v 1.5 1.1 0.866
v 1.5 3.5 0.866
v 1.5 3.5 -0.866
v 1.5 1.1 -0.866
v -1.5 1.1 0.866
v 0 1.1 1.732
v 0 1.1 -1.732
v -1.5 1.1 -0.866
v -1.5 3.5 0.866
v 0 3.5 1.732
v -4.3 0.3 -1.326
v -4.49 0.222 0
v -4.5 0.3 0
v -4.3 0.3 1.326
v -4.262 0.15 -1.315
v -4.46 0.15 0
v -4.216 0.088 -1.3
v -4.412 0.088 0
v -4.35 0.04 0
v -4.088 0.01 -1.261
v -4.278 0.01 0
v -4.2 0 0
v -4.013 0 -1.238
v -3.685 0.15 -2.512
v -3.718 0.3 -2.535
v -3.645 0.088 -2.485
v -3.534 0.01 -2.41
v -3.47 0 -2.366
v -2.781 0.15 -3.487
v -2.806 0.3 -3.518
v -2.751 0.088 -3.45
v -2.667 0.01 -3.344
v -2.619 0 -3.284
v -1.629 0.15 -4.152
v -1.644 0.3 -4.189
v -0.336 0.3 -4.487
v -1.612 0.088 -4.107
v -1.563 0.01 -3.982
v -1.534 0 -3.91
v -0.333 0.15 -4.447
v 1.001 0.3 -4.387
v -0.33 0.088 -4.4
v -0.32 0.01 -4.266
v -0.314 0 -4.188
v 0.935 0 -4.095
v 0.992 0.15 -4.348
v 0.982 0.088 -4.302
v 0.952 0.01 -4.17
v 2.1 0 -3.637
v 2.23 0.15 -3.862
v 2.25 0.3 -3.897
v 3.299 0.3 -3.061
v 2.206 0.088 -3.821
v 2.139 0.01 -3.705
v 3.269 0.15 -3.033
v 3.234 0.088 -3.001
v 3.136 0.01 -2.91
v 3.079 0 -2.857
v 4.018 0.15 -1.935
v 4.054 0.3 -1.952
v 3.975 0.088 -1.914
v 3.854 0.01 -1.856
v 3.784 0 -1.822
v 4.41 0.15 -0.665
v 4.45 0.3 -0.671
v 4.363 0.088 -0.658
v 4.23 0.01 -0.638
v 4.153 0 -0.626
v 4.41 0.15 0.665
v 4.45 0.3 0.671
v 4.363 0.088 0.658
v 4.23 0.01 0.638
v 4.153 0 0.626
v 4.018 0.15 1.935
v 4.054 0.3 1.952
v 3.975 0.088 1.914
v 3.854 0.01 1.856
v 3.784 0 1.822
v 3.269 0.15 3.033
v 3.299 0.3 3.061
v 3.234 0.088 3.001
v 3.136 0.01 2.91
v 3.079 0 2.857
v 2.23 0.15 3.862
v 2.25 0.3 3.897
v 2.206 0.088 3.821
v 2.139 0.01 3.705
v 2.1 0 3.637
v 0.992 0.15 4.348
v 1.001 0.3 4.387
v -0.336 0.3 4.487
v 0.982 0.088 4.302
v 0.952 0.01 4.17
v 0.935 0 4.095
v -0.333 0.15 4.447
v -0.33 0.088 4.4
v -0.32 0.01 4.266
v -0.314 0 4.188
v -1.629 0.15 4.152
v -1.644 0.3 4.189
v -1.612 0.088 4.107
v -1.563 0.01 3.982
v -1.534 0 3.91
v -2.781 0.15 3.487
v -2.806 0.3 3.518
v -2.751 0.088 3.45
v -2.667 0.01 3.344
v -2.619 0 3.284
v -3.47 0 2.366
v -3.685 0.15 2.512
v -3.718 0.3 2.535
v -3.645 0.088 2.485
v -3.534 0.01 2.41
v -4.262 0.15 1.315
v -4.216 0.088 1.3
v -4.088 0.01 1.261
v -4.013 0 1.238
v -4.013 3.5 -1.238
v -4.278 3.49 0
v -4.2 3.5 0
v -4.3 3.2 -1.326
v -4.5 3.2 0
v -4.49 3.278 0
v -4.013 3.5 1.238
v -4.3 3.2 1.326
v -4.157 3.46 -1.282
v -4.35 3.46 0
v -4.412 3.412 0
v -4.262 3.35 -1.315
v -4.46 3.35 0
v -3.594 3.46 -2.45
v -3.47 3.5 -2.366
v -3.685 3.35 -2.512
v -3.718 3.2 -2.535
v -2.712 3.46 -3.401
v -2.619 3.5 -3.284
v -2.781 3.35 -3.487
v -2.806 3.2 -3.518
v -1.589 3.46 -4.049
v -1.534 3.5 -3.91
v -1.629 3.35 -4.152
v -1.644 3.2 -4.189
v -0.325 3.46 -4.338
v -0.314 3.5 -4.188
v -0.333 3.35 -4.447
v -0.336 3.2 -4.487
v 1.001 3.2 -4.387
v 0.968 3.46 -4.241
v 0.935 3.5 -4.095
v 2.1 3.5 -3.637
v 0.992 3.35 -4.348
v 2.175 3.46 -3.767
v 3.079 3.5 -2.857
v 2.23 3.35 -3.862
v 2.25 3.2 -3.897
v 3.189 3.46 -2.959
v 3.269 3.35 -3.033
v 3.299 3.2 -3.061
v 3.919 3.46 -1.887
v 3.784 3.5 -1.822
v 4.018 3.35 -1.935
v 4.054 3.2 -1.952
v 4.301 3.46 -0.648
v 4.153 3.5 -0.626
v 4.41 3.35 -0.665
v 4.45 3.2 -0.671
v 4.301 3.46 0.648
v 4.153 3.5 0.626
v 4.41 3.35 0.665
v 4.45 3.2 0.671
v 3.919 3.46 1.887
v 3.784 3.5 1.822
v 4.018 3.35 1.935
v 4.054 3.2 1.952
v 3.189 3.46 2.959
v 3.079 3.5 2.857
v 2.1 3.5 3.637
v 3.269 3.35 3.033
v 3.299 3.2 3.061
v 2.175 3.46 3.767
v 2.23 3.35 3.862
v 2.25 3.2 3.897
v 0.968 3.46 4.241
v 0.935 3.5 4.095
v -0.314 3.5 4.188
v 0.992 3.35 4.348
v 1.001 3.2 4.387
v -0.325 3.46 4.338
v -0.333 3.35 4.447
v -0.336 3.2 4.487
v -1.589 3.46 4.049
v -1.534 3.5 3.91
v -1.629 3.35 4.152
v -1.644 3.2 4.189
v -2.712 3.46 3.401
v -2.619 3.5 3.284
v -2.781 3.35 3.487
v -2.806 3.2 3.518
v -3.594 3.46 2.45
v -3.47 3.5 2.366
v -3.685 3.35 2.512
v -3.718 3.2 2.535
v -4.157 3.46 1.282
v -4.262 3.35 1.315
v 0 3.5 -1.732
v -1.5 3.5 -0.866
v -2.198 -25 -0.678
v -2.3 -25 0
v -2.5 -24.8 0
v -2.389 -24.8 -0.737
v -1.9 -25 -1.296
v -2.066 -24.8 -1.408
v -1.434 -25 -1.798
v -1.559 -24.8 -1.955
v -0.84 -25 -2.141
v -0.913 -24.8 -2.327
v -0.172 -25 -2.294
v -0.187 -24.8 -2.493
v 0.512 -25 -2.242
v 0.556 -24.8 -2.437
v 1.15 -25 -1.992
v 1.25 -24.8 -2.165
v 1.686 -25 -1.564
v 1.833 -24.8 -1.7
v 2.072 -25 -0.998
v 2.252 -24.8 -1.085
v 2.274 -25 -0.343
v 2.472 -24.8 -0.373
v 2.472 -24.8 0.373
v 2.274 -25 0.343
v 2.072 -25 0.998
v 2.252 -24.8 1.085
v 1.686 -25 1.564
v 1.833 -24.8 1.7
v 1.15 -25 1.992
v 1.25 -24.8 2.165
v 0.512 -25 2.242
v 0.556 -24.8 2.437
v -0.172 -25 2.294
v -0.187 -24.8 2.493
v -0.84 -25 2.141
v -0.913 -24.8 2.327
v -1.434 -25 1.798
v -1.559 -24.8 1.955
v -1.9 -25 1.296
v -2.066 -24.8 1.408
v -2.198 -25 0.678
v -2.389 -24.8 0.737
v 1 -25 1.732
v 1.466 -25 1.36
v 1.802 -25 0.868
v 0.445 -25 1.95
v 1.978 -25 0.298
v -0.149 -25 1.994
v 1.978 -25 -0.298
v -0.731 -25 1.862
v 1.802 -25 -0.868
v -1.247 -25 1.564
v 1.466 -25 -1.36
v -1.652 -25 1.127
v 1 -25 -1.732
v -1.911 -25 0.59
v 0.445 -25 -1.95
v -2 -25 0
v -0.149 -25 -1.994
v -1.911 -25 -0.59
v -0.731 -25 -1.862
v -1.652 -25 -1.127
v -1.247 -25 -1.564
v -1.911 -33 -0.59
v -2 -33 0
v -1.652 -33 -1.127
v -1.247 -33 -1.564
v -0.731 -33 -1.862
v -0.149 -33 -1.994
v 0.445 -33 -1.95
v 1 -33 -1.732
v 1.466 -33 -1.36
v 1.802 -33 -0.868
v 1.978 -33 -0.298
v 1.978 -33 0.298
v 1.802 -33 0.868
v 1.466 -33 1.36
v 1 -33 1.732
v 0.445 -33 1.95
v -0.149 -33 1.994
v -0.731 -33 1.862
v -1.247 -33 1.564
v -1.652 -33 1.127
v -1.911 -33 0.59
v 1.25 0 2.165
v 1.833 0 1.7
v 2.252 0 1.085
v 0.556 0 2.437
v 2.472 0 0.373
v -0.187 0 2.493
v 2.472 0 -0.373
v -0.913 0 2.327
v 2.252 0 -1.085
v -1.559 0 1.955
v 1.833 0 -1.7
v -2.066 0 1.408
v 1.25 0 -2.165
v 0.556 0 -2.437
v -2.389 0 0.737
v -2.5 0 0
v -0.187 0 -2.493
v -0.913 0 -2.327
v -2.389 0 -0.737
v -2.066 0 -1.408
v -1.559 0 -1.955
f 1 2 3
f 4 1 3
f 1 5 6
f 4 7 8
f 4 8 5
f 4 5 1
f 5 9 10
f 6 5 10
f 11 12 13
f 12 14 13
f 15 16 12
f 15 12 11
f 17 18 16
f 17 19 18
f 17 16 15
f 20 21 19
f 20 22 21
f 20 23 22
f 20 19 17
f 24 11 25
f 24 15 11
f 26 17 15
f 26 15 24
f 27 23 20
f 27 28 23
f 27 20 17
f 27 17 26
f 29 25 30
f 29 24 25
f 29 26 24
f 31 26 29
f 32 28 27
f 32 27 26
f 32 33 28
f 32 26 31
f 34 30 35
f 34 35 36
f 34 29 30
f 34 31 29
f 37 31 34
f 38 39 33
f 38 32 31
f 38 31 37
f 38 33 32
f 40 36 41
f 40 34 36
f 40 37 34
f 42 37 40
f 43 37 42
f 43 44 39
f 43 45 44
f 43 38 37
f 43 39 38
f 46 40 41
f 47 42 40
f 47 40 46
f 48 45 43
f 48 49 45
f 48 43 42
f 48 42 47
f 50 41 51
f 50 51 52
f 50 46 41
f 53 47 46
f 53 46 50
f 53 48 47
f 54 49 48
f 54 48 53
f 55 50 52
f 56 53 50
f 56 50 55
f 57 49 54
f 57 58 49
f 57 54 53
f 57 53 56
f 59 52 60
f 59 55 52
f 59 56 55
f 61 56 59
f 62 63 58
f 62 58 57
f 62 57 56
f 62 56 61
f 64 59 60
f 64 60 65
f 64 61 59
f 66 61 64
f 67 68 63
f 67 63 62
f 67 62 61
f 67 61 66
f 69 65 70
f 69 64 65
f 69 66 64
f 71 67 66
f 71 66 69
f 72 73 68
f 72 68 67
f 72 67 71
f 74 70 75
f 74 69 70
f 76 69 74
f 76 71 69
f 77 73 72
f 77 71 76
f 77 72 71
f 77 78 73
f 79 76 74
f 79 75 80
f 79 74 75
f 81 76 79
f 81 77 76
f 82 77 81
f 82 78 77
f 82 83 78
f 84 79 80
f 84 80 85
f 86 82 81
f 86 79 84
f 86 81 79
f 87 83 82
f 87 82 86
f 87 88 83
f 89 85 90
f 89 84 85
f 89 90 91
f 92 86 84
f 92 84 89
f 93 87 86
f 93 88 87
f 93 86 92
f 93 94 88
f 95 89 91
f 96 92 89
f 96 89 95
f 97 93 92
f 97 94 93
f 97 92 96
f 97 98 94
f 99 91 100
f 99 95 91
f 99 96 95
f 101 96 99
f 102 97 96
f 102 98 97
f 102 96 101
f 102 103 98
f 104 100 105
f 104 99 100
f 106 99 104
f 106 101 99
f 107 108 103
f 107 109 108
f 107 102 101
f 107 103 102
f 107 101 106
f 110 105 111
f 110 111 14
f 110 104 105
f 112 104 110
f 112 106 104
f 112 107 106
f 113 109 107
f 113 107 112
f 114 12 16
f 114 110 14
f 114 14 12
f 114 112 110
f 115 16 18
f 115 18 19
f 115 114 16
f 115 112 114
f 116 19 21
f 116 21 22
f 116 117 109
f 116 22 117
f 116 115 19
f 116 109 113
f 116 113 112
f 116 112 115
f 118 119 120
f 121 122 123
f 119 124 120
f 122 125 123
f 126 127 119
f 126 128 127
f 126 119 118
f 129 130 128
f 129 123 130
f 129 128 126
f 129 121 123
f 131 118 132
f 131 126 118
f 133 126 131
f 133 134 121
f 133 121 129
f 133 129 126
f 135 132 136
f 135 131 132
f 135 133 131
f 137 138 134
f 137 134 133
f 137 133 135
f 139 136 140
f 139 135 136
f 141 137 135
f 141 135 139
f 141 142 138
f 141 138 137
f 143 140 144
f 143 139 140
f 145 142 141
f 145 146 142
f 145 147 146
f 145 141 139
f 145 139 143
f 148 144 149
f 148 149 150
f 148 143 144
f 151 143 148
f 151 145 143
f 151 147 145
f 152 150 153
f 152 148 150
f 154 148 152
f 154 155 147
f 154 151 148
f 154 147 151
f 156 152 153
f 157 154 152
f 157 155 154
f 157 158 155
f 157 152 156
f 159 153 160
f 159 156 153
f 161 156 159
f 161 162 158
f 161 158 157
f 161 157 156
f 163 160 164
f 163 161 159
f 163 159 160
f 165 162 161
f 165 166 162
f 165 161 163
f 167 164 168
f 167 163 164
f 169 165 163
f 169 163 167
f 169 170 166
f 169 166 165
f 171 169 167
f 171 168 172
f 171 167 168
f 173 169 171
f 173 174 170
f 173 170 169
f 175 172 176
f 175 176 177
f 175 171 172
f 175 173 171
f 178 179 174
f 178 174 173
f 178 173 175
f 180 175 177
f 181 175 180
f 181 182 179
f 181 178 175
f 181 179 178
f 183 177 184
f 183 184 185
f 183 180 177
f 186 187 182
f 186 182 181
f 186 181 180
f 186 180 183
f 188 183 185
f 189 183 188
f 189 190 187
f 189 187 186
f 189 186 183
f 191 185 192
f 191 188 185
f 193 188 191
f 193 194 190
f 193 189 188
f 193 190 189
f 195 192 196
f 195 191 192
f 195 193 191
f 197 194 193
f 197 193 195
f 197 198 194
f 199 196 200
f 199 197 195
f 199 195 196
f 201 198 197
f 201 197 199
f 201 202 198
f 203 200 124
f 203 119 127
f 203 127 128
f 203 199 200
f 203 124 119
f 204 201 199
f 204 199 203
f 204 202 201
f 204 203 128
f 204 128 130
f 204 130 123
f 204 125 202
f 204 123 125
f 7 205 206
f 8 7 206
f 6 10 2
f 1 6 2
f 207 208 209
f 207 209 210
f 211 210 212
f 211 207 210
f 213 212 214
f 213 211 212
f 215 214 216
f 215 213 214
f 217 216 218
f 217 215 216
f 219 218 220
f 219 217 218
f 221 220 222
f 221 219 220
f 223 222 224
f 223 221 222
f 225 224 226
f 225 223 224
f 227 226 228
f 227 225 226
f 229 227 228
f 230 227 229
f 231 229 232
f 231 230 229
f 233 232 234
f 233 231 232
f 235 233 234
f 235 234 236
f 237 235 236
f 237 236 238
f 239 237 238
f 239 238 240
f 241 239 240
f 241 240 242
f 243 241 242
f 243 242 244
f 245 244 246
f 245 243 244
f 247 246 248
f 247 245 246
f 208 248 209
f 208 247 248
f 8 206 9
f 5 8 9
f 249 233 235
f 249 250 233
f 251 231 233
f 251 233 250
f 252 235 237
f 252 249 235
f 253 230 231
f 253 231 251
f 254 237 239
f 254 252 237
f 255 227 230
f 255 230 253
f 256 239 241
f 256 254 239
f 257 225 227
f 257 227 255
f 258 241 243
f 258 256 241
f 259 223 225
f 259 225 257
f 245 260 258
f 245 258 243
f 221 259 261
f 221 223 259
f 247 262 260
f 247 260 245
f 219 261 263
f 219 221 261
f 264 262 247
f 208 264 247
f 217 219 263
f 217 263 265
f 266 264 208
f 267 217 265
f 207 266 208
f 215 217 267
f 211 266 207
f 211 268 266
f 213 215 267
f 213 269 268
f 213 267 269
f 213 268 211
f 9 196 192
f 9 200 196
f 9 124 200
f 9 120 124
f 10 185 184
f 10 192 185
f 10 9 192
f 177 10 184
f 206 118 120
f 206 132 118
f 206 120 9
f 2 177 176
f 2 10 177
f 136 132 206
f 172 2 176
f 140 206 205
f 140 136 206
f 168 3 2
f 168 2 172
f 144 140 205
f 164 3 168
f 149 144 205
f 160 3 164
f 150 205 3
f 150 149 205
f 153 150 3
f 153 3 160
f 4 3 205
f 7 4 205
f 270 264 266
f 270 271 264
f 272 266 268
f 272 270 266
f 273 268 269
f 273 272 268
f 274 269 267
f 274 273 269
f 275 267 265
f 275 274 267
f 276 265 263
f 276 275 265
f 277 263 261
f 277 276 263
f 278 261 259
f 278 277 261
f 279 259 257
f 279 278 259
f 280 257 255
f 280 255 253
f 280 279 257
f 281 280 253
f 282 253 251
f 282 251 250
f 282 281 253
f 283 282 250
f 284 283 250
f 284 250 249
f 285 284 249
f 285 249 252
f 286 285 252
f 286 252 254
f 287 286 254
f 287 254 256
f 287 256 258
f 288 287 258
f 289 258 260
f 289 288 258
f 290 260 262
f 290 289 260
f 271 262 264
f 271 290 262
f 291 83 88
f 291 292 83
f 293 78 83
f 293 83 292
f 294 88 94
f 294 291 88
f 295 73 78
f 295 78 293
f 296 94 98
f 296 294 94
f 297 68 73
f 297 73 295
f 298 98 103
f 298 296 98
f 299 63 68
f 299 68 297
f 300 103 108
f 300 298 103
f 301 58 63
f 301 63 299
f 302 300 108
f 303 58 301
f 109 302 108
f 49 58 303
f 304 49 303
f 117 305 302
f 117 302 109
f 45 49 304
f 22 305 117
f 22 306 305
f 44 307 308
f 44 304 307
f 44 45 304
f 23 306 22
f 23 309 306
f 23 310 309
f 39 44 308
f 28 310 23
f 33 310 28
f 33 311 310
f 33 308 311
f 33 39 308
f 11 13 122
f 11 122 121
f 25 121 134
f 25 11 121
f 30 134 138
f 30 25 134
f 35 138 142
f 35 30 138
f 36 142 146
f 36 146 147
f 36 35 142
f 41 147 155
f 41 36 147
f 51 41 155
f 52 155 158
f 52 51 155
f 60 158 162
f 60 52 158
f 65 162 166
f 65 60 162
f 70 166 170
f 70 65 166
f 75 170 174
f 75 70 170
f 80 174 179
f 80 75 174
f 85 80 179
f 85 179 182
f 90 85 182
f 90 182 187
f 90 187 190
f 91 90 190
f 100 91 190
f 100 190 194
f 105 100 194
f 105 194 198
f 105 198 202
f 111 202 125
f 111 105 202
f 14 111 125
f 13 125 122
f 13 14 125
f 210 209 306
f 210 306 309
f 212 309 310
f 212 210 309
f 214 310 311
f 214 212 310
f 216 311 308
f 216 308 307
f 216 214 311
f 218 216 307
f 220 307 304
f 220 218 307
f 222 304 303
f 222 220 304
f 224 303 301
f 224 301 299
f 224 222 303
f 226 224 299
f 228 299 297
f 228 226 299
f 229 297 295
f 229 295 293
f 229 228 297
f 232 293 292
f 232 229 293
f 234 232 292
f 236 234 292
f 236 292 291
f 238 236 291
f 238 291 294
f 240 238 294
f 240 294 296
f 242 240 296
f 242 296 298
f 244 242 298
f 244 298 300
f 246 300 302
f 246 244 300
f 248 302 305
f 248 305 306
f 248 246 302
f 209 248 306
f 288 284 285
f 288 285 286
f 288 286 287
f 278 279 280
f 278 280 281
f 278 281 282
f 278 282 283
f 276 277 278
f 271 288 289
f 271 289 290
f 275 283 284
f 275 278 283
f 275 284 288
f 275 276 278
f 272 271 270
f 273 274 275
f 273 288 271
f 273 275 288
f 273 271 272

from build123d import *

# Parameters (mm, degrees)
FILLET1_R          = 0.3
CUT_EXTRUDE1_DEPTH = 2.4
CHAMFER1_SIZE      = 0.2


with BuildPart() as part:
    # Sketch1 → Revolve1 (revolve)
    with BuildSketch(Plane.XY):
        Polygon((0, 3.5), (-4.5, 3.5), (-4.5, 0), (-2.5, 0), (-2.5, -25), (-2, -25), (-2, -33), (0, -33), align=None)
    revolve(axis=Axis((0, 3.5, 0), (0, -1, 0)))

    # Fillet1
    fillet1_edges = [part.edges().sort_by_distance(p)[0] for p in [
        (4.5, 0, 0),
        (4.5, 3.5, 0),
    ]]
    fillet(fillet1_edges, radius=FILLET1_R)

    # Sketch2 → Cut-Extrude1 (cut)
    with BuildSketch(Plane(origin=(0, 3.5, 0), x_dir=(1, 0, 0), z_dir=(0, 1, 0))):
        Polygon((1.5, 0.866025404), (0, 1.732050808), (-1.5, 0.866025404), (-1.5, -0.866025404), (0, -1.732050808), (1.5, -0.866025404), align=None)
    extrude(amount=-CUT_EXTRUDE1_DEPTH, mode=Mode.SUBTRACT)

    # Chamfer1
    chamfer1_edges = [part.edges().sort_by_distance(p)[0] for p in [
        (2.5, -25, 0),
    ]]
    chamfer(chamfer1_edges, length=CHAMFER1_SIZE)


solid = part.part
